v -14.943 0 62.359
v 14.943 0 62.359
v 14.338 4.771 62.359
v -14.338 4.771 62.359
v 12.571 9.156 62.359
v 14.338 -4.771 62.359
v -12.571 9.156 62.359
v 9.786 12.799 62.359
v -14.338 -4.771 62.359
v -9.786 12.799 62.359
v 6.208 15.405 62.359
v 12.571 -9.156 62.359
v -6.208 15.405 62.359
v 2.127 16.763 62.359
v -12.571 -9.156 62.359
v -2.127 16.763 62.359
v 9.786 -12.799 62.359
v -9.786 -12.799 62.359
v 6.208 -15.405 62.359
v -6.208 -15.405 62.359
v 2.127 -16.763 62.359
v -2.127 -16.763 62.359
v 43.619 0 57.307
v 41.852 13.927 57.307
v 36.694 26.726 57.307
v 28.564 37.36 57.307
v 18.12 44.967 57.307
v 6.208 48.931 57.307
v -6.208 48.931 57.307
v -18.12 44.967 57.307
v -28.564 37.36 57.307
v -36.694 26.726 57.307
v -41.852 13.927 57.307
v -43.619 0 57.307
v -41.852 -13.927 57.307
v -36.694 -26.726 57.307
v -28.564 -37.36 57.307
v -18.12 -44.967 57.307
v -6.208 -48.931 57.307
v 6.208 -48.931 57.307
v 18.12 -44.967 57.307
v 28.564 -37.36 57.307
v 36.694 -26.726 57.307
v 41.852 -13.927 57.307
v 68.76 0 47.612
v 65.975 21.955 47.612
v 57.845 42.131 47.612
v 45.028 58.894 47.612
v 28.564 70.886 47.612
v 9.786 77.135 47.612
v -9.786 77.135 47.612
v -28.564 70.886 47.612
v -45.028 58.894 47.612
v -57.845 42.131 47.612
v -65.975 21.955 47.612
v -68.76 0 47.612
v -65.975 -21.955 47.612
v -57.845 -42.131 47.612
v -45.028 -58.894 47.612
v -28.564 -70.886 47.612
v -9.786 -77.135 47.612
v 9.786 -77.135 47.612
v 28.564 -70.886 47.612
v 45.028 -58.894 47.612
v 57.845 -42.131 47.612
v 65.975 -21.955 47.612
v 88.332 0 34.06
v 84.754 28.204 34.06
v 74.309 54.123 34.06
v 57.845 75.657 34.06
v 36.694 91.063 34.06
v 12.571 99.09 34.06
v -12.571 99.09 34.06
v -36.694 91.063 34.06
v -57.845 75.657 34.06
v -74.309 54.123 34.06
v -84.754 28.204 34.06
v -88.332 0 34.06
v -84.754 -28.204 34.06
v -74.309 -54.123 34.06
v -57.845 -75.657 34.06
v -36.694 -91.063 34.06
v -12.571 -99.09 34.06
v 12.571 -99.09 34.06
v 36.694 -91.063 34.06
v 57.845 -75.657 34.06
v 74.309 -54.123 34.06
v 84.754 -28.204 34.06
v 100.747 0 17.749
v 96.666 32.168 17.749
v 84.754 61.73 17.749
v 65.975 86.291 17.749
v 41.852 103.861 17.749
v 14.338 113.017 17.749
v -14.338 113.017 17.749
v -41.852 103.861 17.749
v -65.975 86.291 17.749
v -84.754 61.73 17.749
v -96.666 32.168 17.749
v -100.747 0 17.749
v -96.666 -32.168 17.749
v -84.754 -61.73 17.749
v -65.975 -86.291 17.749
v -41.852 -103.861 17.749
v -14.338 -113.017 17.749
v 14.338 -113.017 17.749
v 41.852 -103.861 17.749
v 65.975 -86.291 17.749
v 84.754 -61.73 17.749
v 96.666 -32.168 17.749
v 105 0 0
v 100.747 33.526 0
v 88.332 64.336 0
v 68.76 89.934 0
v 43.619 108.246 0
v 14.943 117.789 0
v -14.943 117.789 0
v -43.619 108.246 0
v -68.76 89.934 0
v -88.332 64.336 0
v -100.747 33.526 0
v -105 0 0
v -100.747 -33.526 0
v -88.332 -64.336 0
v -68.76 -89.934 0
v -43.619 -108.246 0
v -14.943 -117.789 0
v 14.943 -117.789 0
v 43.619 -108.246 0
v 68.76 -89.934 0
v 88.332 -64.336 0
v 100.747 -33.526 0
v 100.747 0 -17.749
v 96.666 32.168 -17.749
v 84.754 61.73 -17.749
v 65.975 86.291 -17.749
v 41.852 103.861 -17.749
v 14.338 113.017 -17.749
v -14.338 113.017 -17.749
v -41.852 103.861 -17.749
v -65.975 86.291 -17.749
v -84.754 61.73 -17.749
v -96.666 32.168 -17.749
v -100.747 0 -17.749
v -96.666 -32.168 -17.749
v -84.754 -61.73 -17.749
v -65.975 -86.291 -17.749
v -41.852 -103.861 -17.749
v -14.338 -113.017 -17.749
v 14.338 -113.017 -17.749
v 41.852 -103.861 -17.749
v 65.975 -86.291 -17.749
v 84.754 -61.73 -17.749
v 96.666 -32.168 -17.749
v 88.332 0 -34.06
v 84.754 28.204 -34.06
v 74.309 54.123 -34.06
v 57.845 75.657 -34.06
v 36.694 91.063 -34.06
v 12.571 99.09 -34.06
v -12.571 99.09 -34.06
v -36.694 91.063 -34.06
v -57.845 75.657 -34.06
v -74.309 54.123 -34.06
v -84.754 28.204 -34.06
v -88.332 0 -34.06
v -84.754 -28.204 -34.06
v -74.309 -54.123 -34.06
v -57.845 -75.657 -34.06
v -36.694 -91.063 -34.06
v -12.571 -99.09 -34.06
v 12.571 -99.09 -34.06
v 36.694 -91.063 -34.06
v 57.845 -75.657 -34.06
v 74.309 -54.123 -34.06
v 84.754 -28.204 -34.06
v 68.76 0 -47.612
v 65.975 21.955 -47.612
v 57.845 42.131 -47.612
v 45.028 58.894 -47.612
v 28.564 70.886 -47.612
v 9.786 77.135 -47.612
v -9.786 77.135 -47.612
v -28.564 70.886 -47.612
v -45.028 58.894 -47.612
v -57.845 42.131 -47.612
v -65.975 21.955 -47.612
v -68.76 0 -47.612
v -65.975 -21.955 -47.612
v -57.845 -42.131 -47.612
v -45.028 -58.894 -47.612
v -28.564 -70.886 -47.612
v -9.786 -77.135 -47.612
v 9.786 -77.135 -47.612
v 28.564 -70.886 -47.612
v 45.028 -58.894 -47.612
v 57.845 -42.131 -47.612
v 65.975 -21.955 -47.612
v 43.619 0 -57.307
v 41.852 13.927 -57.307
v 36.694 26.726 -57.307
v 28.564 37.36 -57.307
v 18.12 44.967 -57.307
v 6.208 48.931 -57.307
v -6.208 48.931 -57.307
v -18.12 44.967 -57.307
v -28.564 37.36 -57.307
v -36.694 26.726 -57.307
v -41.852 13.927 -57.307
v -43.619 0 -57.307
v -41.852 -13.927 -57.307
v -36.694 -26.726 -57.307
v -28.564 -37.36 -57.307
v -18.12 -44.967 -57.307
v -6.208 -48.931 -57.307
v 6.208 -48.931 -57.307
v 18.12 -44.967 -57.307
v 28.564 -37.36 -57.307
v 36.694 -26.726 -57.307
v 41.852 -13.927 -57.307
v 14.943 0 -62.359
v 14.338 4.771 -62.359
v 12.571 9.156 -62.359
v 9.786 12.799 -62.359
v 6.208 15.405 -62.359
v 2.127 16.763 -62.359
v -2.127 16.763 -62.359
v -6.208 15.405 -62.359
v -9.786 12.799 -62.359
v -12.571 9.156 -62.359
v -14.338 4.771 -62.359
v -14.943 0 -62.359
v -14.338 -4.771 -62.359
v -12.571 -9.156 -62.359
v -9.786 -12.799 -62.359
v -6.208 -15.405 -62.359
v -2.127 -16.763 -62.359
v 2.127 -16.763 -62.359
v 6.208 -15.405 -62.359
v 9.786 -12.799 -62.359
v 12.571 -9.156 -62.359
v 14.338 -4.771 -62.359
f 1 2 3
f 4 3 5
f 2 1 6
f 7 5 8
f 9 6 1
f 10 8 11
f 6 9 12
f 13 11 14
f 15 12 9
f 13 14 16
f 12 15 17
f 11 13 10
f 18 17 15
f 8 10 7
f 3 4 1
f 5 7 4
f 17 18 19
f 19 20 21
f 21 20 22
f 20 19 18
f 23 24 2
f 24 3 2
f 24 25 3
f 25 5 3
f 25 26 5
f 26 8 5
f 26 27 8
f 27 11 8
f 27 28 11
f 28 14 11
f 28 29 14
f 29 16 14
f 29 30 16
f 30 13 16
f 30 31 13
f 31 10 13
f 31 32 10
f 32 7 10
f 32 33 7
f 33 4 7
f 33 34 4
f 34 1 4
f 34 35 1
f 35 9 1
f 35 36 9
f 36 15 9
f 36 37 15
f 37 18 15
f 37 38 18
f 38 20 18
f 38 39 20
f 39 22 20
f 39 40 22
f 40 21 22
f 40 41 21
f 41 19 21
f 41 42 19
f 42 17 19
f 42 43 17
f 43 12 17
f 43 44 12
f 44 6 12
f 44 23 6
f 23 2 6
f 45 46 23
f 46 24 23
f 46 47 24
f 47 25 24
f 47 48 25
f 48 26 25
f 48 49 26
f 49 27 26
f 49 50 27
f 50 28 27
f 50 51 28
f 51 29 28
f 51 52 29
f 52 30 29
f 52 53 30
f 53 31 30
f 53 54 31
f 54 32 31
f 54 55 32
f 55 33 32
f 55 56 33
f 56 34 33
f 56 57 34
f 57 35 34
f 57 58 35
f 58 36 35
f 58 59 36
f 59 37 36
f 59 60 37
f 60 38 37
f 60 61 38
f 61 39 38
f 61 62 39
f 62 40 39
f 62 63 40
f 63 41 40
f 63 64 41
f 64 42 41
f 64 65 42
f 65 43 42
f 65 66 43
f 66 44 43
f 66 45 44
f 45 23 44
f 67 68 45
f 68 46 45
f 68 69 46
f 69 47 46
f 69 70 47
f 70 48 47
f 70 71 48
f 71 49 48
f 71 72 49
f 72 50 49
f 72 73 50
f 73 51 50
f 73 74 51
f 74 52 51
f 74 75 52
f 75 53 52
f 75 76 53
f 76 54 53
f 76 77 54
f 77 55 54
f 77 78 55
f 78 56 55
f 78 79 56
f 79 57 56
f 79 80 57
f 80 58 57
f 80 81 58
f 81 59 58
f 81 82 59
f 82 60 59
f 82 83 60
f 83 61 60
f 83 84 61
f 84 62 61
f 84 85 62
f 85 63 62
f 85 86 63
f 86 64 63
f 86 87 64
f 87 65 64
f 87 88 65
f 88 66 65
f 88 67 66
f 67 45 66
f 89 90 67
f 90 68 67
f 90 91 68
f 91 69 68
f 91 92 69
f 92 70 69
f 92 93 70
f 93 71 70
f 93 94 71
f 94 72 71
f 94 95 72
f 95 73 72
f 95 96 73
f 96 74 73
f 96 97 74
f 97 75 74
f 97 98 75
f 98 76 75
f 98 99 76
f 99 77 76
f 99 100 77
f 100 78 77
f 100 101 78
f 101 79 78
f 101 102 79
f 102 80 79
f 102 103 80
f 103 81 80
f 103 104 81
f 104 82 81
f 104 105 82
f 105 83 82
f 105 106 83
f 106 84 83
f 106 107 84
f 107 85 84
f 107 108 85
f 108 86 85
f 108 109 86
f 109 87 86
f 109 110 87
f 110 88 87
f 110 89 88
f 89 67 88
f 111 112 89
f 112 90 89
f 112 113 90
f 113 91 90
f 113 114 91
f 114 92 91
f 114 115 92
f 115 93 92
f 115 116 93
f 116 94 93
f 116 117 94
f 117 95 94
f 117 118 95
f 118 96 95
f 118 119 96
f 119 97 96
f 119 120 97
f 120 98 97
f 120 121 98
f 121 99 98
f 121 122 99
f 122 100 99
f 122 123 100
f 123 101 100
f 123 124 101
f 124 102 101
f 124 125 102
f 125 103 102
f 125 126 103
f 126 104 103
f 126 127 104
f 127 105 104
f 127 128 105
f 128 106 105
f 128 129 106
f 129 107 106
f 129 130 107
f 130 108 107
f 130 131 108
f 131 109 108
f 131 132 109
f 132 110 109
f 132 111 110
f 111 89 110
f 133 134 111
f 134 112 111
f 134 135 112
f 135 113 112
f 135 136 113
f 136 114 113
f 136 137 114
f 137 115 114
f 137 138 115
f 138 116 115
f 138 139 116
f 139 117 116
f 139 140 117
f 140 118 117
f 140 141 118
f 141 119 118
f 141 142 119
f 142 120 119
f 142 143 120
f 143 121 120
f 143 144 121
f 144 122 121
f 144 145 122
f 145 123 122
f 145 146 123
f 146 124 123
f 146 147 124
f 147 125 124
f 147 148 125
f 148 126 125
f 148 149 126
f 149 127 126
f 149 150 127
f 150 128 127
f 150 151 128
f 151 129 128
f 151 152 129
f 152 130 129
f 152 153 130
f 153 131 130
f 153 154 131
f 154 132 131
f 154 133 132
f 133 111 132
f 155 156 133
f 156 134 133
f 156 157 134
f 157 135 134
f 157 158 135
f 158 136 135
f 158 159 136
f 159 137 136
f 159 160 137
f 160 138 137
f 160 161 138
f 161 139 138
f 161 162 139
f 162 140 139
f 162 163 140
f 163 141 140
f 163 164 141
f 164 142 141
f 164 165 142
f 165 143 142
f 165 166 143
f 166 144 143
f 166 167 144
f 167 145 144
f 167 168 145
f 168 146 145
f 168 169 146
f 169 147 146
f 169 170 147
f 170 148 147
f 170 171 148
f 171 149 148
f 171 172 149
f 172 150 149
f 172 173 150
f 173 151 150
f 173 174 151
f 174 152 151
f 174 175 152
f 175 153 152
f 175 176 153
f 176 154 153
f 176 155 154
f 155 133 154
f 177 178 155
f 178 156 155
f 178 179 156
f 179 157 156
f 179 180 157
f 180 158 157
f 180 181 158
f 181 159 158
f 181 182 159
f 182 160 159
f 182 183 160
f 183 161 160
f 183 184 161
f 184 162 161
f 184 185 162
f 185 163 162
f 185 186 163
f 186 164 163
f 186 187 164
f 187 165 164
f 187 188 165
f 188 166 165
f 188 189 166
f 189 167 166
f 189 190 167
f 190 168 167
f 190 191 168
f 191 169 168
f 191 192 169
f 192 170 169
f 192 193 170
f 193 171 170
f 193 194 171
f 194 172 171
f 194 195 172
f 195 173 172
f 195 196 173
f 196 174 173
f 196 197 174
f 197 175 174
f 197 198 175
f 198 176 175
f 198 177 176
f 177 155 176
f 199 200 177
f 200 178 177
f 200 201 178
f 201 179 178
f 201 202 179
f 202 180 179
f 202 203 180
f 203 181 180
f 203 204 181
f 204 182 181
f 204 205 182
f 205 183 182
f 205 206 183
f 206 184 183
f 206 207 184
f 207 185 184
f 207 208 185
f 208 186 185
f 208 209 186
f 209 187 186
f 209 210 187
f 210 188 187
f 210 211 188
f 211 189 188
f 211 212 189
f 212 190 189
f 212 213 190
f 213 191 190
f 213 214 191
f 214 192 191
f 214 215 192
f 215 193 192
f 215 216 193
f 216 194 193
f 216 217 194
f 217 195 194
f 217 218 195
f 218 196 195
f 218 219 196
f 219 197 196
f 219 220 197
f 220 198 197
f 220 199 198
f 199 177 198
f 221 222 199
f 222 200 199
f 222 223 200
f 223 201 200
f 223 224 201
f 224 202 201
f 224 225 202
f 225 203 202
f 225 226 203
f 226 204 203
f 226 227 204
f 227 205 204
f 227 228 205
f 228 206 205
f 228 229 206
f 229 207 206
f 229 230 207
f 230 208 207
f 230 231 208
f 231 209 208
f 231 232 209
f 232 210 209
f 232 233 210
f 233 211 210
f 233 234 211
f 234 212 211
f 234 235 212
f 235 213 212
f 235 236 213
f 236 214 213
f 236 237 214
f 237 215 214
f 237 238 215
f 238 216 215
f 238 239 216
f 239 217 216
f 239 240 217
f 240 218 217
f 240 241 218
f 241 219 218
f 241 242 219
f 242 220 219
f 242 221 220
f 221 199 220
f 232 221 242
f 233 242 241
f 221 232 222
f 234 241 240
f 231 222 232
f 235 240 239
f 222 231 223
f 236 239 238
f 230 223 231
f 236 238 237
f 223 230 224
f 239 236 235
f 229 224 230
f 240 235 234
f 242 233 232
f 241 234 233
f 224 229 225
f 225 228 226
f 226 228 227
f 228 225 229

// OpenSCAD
// Generated by SolidPython 1.0.1 on 2020-07-29 00:46:52


scale(v = [15, 17, 9]) {
	sphere(r = 7);
}
/***********************************************
*********      SolidPython code:      **********
************************************************
 
# import packages: SolidPython
from solid import *
from solid.utils import *
from itertools import chain, combinations, permutations


class Resize:

    def __init__(self, scad_file):
        self.scad_file = scad_file
        #self.scad_file = import_scad(scad_file)
        # cone/cylinder param:
        self.r1 = 0
        self.r2 = 0
        self.h = 0
        # rectangular prism param:
        self.w = 0
        self.l = 0
        # ellipse param:
        self.r = 0

    # import OpenScad code (file name corresponds to shape)


    # classify shape + parameters
    def assign(self, param1, param2, param3):
        if self.scad_file == 'cone.scad':
            self.r1 = param1
            self.r2 = param2
            self.h = param3
        elif self.scad_file == 'cylinder.scad':
            self.r1 = param1
            self.r2 = param2
            self.h = param3
        elif self.scad_file == 'rectangularPrism.scad':
            self.h = param1
            self.l = param2
            self.w = param3
        else:
            self.r = param1
            self.h = param2

    # resize parameters
    def iterate(self):
        x = range(3, 20, 2)
        i = 1
        if self.scad_file == 'cone.scad':
            tempList = list(permutations(x, 2))
            for temp in tempList:
                param1 = temp[0]
                param2 = temp[1]
                filepath = 'produced_scad_files/' + 'cone' + str(param1) + '_' + str(param2) + '_' + '.scad'
                scad_render_to_file(cylinder(h=param1, r1=param2, r2=0), filepath)

        elif self.scad_file == 'cylinder.scad':
            tempList = list(permutations(x, 3))
            for temp in tempList:
                param1 = temp[0]
                param2 = temp[1]
                filepath = 'produced_scad_files/' + 'cylinder' + str(param1) + '_' + str(param2) + '_' + '.scad'
                scad_render_to_file(cylinder(h=param1, r1=param2, r2=param2), filepath)

        elif self.scad_file == 'rectangularPrism.scad':
            tempList = list(permutations(x, 3))
            for temp in tempList:
                param1 = temp[0]
                param2 = temp[1]
                param3 = temp[2]
                filepath = 'produced_scad_files/' + 'rectangularPrism' + str(param1) + '_' + str(param2) + '_' + str(
                    param3) + '.scad'
                scad_render_to_file(cube(size=(param1, param2, param3)), filepath)

        elif self.scad_file == 'ellipse.scad':
            tempList = list(permutations(x, 4))
            for temp in tempList:
                param1 = temp[0]
                param2 = temp[1]
                param3 = temp[2]
                param4 = temp[3]
                filepath = 'produced_scad_files/' + 'ellipse' + str(param1) + '_' + str(param2) + '_' + str(param3) + '_' + str(param4) + '.scad'
                scad_render_to_file(scale([param1, param2, param3])(sphere(r=param4)), filepath)

    def render_to_scadfile(self):
        scad_render_to_file(scad, 'example.scad') 
 
************************************************/
